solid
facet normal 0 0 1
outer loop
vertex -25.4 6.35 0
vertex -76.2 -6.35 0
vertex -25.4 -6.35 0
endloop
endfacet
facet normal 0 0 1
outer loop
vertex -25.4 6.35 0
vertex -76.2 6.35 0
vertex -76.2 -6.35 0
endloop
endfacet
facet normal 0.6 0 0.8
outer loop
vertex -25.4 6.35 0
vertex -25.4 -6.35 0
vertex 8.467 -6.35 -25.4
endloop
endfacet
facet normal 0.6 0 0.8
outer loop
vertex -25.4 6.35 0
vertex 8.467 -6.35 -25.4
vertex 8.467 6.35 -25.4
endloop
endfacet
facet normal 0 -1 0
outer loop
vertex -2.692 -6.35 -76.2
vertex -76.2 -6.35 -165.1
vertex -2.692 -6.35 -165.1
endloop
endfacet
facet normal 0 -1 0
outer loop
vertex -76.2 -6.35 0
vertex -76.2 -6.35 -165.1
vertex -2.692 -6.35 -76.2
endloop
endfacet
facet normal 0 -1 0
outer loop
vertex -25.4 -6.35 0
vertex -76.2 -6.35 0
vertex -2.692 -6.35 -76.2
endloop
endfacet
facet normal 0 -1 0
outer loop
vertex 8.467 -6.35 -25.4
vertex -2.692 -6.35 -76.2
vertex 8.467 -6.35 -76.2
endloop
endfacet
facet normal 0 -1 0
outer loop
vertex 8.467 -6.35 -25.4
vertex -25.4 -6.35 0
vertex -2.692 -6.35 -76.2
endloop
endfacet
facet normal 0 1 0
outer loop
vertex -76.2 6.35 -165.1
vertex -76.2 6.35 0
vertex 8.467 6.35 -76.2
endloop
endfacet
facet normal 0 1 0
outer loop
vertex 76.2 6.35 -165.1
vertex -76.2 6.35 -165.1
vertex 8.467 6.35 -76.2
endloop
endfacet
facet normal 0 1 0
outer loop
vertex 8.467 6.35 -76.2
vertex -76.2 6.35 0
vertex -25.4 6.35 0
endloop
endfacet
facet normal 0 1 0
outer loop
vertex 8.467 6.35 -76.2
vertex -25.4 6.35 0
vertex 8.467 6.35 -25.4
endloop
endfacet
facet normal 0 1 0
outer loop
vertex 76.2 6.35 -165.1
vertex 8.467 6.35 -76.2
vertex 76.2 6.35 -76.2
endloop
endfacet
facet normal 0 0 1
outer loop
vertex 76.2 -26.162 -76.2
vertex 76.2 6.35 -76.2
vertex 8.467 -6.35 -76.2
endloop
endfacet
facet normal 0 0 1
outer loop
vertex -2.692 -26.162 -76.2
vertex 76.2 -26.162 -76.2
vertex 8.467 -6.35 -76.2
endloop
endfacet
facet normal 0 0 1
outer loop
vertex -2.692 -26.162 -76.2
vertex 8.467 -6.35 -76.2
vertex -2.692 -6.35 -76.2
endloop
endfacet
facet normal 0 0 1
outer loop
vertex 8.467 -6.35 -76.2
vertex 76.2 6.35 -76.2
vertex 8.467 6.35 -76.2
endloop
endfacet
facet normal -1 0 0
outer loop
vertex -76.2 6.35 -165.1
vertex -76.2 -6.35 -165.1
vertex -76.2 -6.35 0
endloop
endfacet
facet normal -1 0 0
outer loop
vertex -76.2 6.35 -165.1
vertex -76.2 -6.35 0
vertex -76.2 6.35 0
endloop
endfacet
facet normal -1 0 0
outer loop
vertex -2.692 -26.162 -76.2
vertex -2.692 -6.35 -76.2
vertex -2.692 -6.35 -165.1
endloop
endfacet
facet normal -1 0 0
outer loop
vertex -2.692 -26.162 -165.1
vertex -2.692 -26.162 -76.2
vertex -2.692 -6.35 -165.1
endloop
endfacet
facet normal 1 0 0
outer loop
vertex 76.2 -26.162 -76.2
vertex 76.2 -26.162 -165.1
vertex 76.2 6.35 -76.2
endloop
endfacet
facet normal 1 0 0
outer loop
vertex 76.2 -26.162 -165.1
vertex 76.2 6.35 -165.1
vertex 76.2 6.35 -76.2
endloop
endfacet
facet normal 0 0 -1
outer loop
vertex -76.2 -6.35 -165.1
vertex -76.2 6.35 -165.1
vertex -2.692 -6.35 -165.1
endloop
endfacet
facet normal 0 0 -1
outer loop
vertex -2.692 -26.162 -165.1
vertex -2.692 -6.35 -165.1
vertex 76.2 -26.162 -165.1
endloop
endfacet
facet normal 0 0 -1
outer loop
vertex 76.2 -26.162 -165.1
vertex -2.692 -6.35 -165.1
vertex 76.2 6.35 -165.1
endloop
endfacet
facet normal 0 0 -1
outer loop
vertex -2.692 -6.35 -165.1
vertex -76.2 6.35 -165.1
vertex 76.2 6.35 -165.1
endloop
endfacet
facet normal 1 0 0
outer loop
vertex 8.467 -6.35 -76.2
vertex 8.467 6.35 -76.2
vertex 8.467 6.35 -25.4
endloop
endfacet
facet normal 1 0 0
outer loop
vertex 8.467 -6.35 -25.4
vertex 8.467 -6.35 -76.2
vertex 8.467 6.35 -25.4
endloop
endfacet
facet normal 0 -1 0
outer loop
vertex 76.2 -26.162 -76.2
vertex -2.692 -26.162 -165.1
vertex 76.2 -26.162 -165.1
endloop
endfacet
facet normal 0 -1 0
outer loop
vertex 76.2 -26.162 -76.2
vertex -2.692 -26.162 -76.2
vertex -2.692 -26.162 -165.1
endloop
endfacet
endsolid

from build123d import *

# Parameters (mm, degrees)
F0_W     = 152.4
F0_H     = 12.7
F1_DEPTH = 165.1
F2_SIZE2 = 101.6
F2_SIZE  = 76.2
F4_DEPTH = 19.812
F6_DEPTH = 25.4


with BuildPart() as f1:
    # F0 (on Top) → F1 (new body)
    with BuildSketch(Plane.XY):
        Rectangle(F0_W, F0_H)
    extrude(amount=-F1_DEPTH)

    # F2
    f2_edges = [f1.edges().sort_by_distance(p)[0] for p in [
        (76.2, 0, 0),
    ]]
    chamfer(f2_edges, length=F2_SIZE, length2=F2_SIZE2)

    # F3 (on face) → F4 (join)
    with BuildSketch(Plane.XZ.offset(6.35)):
        Polygon((-2.6924, -165.1), (76.2, -165.1), (76.2, -120.65), (76.2, -76.2), (-2.6924, -76.2), align=None)
    extrude(amount=F4_DEPTH)

    # F5 (on face) → F6 (cut)
    with BuildSketch(Plane(origin=(0, 6.35, 0), x_dir=(-1, 0, 0), z_dir=(0, 1, 0))):
        Polygon((-8.466667, -25.4), (-76.2, -76.2), (-8.466667, -76.2), align=None)
    extrude(amount=-F6_DEPTH, mode=Mode.SUBTRACT)


solid = f1.part
